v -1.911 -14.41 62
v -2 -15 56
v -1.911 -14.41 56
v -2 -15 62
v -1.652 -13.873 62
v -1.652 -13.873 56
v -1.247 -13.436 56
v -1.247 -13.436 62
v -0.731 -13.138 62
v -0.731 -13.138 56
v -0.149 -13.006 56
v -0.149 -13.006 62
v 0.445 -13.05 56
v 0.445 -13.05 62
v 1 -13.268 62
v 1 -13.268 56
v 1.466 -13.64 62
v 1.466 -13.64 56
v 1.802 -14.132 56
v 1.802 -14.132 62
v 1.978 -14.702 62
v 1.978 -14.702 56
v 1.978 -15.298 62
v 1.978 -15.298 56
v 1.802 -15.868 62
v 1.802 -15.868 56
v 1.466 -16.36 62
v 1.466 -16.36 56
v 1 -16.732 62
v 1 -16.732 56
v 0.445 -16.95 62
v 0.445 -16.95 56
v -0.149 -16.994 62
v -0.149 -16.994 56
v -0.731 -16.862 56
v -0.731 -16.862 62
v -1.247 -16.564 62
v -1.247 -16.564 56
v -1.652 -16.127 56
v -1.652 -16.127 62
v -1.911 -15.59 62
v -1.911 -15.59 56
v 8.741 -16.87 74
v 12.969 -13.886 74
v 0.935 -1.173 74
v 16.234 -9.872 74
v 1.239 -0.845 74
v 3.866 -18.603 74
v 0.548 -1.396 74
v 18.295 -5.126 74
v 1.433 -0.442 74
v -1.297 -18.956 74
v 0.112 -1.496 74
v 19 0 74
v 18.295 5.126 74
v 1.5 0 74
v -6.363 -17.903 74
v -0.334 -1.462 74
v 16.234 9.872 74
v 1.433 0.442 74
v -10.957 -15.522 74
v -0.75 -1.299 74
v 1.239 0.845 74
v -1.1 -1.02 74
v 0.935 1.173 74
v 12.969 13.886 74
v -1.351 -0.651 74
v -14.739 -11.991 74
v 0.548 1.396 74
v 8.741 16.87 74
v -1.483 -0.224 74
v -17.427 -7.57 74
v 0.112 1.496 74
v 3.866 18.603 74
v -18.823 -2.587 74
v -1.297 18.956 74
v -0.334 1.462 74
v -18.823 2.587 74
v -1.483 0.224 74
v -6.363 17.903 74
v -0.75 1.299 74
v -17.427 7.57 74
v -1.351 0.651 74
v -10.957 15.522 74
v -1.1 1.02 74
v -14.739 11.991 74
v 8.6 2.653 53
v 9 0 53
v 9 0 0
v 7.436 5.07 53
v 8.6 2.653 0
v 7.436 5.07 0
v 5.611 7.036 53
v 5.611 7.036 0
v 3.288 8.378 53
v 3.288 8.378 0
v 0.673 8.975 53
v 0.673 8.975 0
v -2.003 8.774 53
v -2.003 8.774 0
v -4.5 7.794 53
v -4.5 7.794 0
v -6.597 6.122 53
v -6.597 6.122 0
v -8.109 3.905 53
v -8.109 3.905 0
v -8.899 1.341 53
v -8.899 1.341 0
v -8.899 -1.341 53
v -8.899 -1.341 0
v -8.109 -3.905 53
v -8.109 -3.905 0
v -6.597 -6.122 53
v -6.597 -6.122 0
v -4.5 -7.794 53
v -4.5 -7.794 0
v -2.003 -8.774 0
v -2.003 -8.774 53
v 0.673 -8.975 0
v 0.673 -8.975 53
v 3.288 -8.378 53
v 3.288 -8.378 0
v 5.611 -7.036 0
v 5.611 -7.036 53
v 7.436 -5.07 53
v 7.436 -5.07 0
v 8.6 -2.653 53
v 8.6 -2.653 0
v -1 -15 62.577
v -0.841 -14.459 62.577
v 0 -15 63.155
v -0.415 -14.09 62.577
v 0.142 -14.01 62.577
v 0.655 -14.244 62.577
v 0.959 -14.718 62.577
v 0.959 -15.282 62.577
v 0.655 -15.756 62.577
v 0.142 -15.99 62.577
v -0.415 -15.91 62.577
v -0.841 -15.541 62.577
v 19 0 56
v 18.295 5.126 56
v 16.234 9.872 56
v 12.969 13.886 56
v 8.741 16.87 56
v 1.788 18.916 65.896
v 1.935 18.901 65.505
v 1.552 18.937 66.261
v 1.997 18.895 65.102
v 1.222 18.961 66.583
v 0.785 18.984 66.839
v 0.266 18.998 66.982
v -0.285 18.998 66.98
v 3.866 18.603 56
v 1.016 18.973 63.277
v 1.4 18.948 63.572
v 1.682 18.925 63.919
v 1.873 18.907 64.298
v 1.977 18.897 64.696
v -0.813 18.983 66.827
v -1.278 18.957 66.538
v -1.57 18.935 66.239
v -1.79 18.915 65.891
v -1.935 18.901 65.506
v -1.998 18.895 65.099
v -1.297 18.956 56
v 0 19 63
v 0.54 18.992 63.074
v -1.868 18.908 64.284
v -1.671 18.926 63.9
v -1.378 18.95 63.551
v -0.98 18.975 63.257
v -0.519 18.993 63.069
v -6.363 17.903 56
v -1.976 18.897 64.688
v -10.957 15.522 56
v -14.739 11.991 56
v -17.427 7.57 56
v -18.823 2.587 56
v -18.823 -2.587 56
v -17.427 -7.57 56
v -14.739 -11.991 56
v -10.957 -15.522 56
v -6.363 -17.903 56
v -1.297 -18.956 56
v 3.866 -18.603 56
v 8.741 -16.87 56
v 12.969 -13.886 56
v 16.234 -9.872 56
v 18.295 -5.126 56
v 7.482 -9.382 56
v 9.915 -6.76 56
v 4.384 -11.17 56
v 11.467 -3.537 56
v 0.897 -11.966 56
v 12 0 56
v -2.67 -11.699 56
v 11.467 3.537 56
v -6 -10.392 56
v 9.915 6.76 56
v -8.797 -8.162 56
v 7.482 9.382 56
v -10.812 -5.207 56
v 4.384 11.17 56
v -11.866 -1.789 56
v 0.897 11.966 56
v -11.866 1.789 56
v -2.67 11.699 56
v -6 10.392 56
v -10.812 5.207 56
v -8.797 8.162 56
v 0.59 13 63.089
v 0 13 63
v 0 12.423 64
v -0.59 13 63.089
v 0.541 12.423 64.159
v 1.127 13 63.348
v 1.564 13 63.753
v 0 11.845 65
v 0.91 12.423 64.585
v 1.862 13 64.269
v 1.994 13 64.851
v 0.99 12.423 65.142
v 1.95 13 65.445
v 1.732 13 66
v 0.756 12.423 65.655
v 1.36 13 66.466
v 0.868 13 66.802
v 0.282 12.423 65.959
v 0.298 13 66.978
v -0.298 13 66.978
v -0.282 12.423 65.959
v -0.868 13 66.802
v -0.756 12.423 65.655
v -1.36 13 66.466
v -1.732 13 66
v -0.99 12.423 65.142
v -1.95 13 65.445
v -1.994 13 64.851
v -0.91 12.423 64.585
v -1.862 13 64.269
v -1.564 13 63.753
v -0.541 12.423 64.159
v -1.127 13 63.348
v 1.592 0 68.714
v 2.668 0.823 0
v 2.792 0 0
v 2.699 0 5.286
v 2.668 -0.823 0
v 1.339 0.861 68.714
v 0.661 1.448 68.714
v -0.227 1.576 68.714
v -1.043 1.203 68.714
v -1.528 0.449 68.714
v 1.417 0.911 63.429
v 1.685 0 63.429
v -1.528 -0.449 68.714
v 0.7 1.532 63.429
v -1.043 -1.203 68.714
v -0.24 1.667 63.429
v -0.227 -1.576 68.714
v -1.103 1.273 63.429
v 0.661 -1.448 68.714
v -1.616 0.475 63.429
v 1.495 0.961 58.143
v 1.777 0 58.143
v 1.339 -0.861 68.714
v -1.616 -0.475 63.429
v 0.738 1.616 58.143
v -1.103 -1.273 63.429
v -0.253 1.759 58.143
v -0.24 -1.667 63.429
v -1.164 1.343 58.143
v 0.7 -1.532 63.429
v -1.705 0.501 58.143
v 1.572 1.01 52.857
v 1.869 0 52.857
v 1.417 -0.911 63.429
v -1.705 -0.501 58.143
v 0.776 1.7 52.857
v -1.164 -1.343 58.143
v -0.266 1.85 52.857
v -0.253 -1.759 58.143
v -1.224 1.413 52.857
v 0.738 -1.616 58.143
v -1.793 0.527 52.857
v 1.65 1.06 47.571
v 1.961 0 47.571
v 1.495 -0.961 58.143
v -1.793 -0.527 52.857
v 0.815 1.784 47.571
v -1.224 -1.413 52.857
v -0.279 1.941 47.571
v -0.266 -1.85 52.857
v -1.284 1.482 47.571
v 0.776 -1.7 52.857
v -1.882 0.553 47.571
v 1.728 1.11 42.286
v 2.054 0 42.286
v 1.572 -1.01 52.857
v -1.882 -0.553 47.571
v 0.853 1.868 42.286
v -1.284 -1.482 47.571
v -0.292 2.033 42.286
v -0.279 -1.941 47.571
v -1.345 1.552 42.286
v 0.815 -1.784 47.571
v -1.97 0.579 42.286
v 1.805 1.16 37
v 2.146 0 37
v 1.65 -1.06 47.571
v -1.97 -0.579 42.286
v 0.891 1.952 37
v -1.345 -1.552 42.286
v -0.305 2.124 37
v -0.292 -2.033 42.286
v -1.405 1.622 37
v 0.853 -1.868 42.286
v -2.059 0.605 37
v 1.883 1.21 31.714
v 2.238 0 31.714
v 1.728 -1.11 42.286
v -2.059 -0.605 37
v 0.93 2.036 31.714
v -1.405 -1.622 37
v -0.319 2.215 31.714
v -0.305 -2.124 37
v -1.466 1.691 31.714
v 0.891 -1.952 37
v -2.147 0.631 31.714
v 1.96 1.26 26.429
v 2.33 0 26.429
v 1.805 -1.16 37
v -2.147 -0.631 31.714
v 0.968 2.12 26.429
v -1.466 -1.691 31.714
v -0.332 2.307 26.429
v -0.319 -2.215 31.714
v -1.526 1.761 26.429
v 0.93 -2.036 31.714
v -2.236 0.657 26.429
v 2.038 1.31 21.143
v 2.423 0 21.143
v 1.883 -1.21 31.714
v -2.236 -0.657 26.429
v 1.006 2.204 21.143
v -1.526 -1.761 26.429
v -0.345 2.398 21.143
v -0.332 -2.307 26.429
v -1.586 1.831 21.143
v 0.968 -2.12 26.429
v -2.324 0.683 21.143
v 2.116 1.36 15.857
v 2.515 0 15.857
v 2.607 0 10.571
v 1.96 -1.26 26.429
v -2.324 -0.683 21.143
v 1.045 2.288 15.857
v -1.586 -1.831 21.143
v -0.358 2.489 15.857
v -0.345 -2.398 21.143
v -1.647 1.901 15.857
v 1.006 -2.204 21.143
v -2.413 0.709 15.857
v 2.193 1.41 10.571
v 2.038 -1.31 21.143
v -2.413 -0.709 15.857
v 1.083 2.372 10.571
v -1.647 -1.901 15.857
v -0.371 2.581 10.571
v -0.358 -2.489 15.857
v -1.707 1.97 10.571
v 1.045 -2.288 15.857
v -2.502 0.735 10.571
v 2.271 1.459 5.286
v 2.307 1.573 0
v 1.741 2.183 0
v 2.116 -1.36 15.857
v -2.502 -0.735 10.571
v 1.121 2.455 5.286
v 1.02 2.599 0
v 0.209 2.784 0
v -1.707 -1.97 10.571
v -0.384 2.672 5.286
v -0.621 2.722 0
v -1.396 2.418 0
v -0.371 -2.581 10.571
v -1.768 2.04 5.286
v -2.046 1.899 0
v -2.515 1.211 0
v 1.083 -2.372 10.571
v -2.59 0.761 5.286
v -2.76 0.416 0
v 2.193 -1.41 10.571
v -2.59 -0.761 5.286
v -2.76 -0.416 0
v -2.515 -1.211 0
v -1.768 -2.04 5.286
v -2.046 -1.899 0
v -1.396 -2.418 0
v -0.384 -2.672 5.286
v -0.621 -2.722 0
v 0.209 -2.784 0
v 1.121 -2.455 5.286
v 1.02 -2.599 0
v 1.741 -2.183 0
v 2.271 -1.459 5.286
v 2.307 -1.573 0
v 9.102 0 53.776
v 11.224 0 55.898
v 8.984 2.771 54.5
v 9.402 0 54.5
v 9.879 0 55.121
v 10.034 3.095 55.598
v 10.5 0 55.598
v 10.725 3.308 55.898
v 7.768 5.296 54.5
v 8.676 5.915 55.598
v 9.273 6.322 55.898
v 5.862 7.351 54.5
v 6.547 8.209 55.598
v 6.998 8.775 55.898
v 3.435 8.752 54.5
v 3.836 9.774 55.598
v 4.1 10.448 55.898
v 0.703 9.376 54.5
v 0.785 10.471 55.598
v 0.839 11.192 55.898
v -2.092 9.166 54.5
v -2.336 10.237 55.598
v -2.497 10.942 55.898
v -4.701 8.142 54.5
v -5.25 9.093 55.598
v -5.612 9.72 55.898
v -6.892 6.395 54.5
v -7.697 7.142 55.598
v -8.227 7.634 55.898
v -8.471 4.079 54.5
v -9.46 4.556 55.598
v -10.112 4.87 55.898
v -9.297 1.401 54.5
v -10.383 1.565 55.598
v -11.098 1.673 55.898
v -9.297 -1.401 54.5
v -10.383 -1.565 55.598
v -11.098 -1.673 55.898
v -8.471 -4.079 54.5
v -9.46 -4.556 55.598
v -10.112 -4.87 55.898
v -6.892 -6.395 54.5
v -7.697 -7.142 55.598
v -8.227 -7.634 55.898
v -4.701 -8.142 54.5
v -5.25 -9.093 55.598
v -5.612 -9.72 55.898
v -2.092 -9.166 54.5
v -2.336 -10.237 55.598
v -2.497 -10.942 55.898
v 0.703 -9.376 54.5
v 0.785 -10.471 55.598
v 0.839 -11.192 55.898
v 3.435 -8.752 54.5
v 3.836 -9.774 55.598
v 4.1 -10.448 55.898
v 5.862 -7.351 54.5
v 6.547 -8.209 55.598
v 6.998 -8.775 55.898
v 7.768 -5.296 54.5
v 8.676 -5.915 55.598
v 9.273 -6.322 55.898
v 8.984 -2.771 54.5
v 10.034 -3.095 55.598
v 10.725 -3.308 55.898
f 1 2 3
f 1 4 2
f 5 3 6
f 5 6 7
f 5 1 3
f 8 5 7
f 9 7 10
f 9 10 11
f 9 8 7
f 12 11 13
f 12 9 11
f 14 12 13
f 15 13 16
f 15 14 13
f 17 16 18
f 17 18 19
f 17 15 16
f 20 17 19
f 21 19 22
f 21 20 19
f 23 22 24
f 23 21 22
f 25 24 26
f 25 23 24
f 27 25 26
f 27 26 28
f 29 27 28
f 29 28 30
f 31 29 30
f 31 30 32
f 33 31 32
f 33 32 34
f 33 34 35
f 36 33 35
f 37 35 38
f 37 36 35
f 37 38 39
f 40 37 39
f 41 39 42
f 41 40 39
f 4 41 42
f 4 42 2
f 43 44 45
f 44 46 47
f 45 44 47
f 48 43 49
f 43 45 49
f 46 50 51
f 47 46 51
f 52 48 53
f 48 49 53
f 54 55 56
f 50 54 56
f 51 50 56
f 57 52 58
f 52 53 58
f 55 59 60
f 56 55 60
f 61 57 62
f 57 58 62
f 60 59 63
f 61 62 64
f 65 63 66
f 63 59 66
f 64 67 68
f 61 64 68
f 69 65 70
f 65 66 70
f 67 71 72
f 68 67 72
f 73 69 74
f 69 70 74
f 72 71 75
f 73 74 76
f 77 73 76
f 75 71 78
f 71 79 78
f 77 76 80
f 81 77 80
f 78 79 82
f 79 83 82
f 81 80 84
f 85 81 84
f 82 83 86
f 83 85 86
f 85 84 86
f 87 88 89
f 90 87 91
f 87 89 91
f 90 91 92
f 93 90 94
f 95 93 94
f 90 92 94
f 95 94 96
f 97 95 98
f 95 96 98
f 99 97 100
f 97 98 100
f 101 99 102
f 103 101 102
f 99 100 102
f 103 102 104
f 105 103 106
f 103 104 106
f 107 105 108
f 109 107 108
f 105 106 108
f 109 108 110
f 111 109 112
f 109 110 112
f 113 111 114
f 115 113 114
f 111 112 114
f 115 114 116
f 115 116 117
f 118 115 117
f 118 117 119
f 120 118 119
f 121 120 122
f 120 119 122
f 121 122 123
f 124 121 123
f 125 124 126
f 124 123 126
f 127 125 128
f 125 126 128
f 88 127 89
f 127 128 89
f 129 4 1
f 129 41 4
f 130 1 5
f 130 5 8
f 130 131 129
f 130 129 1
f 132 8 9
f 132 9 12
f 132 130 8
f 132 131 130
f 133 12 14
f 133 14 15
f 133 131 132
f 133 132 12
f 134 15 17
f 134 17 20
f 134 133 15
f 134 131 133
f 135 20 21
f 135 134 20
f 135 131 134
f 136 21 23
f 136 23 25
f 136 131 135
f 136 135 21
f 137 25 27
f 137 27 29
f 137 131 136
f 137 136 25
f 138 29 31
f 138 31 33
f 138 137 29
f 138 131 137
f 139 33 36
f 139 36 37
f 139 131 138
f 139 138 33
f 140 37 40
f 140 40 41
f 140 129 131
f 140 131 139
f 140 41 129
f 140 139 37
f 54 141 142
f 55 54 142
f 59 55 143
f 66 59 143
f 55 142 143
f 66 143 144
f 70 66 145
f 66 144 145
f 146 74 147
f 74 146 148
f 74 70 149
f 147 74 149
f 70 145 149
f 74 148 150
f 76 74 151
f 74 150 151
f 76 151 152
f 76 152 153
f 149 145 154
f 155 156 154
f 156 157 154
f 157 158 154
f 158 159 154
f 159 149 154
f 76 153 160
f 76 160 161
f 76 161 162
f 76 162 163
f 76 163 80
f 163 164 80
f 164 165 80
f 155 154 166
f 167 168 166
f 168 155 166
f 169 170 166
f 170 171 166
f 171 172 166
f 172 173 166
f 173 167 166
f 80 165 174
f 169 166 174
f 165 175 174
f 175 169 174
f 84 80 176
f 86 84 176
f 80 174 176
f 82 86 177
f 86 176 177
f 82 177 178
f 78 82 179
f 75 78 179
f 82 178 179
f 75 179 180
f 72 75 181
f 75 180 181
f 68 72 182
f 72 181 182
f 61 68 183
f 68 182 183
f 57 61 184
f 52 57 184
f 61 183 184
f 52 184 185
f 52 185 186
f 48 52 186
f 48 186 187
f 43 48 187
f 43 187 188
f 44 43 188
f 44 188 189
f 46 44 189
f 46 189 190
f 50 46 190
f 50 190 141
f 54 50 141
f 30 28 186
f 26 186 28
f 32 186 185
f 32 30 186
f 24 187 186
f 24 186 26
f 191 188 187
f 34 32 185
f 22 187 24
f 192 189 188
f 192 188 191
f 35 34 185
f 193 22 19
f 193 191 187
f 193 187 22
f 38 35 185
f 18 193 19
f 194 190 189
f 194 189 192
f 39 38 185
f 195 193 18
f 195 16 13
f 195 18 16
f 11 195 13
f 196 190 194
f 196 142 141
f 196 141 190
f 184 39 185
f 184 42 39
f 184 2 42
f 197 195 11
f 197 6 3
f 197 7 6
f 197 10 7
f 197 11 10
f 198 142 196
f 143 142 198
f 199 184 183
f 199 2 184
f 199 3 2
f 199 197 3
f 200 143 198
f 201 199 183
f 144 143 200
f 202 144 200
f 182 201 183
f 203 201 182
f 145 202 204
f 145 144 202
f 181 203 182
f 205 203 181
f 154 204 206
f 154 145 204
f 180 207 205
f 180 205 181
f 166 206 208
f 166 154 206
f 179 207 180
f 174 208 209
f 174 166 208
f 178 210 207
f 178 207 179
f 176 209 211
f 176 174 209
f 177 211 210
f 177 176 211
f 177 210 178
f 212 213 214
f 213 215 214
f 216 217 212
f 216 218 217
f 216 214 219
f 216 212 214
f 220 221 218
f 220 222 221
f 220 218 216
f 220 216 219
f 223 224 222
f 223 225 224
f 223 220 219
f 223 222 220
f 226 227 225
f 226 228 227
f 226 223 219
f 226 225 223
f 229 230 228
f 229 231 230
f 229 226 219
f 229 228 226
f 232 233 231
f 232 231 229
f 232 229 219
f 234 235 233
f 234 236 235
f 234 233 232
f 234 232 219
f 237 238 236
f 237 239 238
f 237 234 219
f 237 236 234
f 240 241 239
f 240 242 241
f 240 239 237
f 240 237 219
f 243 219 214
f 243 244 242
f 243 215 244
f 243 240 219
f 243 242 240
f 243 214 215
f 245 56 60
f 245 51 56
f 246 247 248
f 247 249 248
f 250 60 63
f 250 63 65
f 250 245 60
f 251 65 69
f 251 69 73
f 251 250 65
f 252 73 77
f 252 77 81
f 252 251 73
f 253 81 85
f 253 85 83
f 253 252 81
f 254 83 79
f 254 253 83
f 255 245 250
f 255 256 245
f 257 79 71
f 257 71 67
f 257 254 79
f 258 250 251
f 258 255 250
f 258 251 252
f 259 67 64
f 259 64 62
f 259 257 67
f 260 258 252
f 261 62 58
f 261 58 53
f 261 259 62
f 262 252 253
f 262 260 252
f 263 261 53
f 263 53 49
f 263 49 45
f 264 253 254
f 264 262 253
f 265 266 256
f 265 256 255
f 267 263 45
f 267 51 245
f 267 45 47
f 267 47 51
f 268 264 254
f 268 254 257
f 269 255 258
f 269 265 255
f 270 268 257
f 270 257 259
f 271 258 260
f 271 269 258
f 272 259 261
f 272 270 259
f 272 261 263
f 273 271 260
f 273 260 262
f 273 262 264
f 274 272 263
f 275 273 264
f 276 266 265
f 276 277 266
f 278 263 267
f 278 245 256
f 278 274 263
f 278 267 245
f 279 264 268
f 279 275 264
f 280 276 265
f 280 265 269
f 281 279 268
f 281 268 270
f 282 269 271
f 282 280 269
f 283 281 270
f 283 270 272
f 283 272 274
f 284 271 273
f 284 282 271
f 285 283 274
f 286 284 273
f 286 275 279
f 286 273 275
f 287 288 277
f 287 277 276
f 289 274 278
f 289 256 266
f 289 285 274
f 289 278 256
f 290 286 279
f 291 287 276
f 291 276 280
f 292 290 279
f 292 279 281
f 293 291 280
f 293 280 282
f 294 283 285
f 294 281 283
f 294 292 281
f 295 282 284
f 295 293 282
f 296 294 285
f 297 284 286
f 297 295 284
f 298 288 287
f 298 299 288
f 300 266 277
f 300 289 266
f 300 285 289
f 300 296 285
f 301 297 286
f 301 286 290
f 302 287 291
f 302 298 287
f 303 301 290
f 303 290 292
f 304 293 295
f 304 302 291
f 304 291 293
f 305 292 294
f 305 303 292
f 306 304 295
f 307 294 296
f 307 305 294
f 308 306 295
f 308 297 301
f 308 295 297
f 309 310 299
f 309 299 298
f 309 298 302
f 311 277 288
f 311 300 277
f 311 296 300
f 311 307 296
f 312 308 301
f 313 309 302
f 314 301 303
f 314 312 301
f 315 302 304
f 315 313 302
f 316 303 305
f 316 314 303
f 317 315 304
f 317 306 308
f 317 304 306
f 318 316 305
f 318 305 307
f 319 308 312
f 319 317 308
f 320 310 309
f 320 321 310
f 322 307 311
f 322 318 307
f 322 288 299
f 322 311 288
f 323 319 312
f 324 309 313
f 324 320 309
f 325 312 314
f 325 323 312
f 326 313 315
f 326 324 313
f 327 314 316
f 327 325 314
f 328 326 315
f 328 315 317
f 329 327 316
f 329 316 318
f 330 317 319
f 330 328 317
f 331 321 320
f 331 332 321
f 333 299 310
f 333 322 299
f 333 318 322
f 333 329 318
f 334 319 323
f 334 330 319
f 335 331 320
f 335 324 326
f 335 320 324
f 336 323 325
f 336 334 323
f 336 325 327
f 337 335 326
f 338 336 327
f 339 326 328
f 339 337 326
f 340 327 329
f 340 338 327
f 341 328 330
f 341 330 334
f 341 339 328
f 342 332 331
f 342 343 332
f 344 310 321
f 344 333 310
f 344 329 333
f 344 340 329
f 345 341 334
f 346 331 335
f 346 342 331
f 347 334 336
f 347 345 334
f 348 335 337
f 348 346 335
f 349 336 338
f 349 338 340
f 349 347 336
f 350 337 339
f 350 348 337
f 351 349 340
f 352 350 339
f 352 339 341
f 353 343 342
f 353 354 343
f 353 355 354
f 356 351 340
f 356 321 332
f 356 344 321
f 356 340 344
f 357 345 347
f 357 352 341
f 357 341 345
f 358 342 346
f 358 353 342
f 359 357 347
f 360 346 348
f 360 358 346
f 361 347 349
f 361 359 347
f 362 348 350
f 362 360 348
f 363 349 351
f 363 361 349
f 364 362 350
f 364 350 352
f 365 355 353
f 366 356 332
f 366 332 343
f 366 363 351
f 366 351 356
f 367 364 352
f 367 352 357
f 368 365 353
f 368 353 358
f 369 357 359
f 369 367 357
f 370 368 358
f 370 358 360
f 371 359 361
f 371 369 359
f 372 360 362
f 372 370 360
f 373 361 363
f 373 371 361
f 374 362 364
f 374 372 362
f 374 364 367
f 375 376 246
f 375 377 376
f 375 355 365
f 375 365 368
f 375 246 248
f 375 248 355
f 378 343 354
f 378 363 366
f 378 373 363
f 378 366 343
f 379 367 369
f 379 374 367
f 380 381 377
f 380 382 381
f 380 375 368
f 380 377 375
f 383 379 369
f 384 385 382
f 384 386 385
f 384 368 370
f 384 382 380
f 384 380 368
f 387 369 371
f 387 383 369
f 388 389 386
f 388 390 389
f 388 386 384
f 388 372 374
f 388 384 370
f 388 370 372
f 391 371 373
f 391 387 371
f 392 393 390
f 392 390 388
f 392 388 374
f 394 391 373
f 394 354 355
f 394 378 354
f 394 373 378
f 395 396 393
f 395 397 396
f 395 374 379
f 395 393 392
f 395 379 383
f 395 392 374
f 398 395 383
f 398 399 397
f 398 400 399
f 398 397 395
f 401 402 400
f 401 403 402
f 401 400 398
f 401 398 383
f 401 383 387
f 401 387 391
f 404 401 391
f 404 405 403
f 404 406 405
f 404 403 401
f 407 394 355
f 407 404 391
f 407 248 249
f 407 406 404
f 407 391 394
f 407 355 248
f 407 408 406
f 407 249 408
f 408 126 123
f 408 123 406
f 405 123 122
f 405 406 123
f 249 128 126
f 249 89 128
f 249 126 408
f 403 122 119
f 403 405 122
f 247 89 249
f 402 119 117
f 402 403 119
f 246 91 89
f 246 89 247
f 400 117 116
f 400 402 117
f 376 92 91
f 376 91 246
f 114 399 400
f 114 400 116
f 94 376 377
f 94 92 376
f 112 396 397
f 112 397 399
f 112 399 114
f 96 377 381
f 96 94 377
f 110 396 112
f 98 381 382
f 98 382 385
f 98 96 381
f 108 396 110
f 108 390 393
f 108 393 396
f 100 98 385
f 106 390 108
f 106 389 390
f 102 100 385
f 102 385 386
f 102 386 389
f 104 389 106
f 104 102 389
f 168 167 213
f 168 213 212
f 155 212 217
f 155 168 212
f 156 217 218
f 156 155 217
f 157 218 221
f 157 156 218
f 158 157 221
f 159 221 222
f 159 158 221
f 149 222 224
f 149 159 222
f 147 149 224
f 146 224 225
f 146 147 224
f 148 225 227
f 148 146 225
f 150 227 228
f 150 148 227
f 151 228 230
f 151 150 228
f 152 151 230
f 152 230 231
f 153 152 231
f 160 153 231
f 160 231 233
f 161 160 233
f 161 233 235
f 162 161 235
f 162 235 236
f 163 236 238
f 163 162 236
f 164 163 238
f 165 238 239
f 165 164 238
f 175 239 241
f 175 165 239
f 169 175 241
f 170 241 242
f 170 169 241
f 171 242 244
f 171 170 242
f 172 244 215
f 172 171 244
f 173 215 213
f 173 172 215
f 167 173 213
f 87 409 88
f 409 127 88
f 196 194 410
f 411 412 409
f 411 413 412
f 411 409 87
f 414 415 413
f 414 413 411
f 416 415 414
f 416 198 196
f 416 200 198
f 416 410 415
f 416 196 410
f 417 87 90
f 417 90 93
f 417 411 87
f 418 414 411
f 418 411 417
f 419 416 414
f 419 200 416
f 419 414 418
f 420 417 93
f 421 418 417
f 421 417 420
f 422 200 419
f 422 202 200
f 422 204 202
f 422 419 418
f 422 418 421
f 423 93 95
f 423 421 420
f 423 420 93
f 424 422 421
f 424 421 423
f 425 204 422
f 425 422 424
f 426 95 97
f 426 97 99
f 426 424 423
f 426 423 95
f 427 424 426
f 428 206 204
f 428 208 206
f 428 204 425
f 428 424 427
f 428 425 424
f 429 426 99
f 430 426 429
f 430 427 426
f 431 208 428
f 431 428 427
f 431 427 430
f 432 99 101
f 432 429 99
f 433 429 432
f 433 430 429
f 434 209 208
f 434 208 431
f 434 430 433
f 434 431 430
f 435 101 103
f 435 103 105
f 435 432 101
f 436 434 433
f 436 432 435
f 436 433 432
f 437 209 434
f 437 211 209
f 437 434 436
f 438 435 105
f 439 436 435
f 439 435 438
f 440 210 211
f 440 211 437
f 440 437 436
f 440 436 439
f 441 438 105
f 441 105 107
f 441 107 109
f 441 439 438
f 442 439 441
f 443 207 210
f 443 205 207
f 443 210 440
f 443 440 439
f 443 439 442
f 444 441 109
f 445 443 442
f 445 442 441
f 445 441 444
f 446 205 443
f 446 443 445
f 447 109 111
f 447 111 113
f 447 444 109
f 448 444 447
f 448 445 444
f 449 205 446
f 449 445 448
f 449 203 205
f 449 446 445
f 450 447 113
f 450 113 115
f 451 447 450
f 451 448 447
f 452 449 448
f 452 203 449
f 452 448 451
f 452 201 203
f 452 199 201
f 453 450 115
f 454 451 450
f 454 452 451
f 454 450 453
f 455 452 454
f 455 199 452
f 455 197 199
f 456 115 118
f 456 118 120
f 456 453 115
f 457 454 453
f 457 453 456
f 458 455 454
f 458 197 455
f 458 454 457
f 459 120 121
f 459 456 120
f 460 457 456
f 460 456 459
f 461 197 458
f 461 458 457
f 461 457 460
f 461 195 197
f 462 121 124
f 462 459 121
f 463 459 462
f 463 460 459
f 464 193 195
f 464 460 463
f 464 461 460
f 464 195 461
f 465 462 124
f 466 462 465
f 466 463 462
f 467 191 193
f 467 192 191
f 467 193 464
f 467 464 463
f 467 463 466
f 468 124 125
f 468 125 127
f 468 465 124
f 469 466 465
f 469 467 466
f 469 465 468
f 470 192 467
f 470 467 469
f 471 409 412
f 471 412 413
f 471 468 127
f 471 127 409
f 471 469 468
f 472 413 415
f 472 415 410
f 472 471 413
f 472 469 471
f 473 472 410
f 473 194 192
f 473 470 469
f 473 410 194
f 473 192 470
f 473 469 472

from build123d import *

# Parameters (mm, degrees)
SZKIC2_W = 56
SZKIC2_H = 9
SZKIC3_W = 18
SZKIC3_H = 19


with BuildPart() as part:
    # Szkic2 → Obrót1 (revolve)
    with BuildSketch(Plane(origin=(0, 0, 0), x_dir=(0, 0, -1), z_dir=(1, 0, 0))):
        with Locations((-28, 4.5)):
            Rectangle(SZKIC2_W, SZKIC2_H)
    revolve(axis=Axis((0, 0, 0), (0, 0, 1)))

    # Szkic3 → Obrót2 (revolve)
    with BuildSketch(Plane(origin=(0, 0, 0), x_dir=(0, 0, -1), z_dir=(1, 0, 0))):
        with Locations((-65, 9.5)):
            Rectangle(SZKIC3_W, SZKIC3_H)
    revolve(axis=Axis((0, 0, 56), (0, 0, 1)))

    # Szkic4 → Wycięcie-obrót1 (revolve, cut)
    with BuildSketch(Plane(origin=(0, 0, 0), x_dir=(0, 0, -1), z_dir=(1, 0, 0))):
        Polygon((-74, 0), (-74, 1.5), (0, 2.791674805), (0, 0), align=None)
    revolve(axis=Axis((0, 0, 0), (0, 0, 1)), mode=Mode.SUBTRACT)

    # Szkic5 → Wycięcie-obrót2 (revolve, cut)
    with BuildSketch(Plane(origin=(0, 0, 0), x_dir=(0, 0, -1), z_dir=(1, 0, 0))):
        Polygon((-65, 11.845299462), (-67, 13), (-67, 19), (-65, 19), align=None)
    revolve(axis=Axis((0, 19, 65), (0, -1, 0)), mode=Mode.SUBTRACT)

    # Szkic6 → Obrót3 (revolve)
    with BuildSketch(Plane(origin=(0, 0, 0), x_dir=(0, 0, -1), z_dir=(1, 0, 0))):
        with BuildLine():
            Line((-56, 9), (-53, 9))
            ThreePointArc((-53, 9), (-55.121320344, 9.878679656), (-56, 12))
            Line((-56, 12), (-56, 9))
        make_face()
    revolve(axis=Axis((0, 0, 0), (0, 0, 1)))

    # Szkic1 → Wycięcie-obrót3 (revolve, cut)
    with BuildSketch(Plane(origin=(0, -15, 0), x_dir=(1, 0, 0), z_dir=(0, 1, 0))):
        Polygon((0, -56), (2, -56), (2, -62), (0, -63.154700538), align=None)
    revolve(axis=Axis((0, -15, 63.154700538), (0, 0, -1)), mode=Mode.SUBTRACT)


solid = part.part
